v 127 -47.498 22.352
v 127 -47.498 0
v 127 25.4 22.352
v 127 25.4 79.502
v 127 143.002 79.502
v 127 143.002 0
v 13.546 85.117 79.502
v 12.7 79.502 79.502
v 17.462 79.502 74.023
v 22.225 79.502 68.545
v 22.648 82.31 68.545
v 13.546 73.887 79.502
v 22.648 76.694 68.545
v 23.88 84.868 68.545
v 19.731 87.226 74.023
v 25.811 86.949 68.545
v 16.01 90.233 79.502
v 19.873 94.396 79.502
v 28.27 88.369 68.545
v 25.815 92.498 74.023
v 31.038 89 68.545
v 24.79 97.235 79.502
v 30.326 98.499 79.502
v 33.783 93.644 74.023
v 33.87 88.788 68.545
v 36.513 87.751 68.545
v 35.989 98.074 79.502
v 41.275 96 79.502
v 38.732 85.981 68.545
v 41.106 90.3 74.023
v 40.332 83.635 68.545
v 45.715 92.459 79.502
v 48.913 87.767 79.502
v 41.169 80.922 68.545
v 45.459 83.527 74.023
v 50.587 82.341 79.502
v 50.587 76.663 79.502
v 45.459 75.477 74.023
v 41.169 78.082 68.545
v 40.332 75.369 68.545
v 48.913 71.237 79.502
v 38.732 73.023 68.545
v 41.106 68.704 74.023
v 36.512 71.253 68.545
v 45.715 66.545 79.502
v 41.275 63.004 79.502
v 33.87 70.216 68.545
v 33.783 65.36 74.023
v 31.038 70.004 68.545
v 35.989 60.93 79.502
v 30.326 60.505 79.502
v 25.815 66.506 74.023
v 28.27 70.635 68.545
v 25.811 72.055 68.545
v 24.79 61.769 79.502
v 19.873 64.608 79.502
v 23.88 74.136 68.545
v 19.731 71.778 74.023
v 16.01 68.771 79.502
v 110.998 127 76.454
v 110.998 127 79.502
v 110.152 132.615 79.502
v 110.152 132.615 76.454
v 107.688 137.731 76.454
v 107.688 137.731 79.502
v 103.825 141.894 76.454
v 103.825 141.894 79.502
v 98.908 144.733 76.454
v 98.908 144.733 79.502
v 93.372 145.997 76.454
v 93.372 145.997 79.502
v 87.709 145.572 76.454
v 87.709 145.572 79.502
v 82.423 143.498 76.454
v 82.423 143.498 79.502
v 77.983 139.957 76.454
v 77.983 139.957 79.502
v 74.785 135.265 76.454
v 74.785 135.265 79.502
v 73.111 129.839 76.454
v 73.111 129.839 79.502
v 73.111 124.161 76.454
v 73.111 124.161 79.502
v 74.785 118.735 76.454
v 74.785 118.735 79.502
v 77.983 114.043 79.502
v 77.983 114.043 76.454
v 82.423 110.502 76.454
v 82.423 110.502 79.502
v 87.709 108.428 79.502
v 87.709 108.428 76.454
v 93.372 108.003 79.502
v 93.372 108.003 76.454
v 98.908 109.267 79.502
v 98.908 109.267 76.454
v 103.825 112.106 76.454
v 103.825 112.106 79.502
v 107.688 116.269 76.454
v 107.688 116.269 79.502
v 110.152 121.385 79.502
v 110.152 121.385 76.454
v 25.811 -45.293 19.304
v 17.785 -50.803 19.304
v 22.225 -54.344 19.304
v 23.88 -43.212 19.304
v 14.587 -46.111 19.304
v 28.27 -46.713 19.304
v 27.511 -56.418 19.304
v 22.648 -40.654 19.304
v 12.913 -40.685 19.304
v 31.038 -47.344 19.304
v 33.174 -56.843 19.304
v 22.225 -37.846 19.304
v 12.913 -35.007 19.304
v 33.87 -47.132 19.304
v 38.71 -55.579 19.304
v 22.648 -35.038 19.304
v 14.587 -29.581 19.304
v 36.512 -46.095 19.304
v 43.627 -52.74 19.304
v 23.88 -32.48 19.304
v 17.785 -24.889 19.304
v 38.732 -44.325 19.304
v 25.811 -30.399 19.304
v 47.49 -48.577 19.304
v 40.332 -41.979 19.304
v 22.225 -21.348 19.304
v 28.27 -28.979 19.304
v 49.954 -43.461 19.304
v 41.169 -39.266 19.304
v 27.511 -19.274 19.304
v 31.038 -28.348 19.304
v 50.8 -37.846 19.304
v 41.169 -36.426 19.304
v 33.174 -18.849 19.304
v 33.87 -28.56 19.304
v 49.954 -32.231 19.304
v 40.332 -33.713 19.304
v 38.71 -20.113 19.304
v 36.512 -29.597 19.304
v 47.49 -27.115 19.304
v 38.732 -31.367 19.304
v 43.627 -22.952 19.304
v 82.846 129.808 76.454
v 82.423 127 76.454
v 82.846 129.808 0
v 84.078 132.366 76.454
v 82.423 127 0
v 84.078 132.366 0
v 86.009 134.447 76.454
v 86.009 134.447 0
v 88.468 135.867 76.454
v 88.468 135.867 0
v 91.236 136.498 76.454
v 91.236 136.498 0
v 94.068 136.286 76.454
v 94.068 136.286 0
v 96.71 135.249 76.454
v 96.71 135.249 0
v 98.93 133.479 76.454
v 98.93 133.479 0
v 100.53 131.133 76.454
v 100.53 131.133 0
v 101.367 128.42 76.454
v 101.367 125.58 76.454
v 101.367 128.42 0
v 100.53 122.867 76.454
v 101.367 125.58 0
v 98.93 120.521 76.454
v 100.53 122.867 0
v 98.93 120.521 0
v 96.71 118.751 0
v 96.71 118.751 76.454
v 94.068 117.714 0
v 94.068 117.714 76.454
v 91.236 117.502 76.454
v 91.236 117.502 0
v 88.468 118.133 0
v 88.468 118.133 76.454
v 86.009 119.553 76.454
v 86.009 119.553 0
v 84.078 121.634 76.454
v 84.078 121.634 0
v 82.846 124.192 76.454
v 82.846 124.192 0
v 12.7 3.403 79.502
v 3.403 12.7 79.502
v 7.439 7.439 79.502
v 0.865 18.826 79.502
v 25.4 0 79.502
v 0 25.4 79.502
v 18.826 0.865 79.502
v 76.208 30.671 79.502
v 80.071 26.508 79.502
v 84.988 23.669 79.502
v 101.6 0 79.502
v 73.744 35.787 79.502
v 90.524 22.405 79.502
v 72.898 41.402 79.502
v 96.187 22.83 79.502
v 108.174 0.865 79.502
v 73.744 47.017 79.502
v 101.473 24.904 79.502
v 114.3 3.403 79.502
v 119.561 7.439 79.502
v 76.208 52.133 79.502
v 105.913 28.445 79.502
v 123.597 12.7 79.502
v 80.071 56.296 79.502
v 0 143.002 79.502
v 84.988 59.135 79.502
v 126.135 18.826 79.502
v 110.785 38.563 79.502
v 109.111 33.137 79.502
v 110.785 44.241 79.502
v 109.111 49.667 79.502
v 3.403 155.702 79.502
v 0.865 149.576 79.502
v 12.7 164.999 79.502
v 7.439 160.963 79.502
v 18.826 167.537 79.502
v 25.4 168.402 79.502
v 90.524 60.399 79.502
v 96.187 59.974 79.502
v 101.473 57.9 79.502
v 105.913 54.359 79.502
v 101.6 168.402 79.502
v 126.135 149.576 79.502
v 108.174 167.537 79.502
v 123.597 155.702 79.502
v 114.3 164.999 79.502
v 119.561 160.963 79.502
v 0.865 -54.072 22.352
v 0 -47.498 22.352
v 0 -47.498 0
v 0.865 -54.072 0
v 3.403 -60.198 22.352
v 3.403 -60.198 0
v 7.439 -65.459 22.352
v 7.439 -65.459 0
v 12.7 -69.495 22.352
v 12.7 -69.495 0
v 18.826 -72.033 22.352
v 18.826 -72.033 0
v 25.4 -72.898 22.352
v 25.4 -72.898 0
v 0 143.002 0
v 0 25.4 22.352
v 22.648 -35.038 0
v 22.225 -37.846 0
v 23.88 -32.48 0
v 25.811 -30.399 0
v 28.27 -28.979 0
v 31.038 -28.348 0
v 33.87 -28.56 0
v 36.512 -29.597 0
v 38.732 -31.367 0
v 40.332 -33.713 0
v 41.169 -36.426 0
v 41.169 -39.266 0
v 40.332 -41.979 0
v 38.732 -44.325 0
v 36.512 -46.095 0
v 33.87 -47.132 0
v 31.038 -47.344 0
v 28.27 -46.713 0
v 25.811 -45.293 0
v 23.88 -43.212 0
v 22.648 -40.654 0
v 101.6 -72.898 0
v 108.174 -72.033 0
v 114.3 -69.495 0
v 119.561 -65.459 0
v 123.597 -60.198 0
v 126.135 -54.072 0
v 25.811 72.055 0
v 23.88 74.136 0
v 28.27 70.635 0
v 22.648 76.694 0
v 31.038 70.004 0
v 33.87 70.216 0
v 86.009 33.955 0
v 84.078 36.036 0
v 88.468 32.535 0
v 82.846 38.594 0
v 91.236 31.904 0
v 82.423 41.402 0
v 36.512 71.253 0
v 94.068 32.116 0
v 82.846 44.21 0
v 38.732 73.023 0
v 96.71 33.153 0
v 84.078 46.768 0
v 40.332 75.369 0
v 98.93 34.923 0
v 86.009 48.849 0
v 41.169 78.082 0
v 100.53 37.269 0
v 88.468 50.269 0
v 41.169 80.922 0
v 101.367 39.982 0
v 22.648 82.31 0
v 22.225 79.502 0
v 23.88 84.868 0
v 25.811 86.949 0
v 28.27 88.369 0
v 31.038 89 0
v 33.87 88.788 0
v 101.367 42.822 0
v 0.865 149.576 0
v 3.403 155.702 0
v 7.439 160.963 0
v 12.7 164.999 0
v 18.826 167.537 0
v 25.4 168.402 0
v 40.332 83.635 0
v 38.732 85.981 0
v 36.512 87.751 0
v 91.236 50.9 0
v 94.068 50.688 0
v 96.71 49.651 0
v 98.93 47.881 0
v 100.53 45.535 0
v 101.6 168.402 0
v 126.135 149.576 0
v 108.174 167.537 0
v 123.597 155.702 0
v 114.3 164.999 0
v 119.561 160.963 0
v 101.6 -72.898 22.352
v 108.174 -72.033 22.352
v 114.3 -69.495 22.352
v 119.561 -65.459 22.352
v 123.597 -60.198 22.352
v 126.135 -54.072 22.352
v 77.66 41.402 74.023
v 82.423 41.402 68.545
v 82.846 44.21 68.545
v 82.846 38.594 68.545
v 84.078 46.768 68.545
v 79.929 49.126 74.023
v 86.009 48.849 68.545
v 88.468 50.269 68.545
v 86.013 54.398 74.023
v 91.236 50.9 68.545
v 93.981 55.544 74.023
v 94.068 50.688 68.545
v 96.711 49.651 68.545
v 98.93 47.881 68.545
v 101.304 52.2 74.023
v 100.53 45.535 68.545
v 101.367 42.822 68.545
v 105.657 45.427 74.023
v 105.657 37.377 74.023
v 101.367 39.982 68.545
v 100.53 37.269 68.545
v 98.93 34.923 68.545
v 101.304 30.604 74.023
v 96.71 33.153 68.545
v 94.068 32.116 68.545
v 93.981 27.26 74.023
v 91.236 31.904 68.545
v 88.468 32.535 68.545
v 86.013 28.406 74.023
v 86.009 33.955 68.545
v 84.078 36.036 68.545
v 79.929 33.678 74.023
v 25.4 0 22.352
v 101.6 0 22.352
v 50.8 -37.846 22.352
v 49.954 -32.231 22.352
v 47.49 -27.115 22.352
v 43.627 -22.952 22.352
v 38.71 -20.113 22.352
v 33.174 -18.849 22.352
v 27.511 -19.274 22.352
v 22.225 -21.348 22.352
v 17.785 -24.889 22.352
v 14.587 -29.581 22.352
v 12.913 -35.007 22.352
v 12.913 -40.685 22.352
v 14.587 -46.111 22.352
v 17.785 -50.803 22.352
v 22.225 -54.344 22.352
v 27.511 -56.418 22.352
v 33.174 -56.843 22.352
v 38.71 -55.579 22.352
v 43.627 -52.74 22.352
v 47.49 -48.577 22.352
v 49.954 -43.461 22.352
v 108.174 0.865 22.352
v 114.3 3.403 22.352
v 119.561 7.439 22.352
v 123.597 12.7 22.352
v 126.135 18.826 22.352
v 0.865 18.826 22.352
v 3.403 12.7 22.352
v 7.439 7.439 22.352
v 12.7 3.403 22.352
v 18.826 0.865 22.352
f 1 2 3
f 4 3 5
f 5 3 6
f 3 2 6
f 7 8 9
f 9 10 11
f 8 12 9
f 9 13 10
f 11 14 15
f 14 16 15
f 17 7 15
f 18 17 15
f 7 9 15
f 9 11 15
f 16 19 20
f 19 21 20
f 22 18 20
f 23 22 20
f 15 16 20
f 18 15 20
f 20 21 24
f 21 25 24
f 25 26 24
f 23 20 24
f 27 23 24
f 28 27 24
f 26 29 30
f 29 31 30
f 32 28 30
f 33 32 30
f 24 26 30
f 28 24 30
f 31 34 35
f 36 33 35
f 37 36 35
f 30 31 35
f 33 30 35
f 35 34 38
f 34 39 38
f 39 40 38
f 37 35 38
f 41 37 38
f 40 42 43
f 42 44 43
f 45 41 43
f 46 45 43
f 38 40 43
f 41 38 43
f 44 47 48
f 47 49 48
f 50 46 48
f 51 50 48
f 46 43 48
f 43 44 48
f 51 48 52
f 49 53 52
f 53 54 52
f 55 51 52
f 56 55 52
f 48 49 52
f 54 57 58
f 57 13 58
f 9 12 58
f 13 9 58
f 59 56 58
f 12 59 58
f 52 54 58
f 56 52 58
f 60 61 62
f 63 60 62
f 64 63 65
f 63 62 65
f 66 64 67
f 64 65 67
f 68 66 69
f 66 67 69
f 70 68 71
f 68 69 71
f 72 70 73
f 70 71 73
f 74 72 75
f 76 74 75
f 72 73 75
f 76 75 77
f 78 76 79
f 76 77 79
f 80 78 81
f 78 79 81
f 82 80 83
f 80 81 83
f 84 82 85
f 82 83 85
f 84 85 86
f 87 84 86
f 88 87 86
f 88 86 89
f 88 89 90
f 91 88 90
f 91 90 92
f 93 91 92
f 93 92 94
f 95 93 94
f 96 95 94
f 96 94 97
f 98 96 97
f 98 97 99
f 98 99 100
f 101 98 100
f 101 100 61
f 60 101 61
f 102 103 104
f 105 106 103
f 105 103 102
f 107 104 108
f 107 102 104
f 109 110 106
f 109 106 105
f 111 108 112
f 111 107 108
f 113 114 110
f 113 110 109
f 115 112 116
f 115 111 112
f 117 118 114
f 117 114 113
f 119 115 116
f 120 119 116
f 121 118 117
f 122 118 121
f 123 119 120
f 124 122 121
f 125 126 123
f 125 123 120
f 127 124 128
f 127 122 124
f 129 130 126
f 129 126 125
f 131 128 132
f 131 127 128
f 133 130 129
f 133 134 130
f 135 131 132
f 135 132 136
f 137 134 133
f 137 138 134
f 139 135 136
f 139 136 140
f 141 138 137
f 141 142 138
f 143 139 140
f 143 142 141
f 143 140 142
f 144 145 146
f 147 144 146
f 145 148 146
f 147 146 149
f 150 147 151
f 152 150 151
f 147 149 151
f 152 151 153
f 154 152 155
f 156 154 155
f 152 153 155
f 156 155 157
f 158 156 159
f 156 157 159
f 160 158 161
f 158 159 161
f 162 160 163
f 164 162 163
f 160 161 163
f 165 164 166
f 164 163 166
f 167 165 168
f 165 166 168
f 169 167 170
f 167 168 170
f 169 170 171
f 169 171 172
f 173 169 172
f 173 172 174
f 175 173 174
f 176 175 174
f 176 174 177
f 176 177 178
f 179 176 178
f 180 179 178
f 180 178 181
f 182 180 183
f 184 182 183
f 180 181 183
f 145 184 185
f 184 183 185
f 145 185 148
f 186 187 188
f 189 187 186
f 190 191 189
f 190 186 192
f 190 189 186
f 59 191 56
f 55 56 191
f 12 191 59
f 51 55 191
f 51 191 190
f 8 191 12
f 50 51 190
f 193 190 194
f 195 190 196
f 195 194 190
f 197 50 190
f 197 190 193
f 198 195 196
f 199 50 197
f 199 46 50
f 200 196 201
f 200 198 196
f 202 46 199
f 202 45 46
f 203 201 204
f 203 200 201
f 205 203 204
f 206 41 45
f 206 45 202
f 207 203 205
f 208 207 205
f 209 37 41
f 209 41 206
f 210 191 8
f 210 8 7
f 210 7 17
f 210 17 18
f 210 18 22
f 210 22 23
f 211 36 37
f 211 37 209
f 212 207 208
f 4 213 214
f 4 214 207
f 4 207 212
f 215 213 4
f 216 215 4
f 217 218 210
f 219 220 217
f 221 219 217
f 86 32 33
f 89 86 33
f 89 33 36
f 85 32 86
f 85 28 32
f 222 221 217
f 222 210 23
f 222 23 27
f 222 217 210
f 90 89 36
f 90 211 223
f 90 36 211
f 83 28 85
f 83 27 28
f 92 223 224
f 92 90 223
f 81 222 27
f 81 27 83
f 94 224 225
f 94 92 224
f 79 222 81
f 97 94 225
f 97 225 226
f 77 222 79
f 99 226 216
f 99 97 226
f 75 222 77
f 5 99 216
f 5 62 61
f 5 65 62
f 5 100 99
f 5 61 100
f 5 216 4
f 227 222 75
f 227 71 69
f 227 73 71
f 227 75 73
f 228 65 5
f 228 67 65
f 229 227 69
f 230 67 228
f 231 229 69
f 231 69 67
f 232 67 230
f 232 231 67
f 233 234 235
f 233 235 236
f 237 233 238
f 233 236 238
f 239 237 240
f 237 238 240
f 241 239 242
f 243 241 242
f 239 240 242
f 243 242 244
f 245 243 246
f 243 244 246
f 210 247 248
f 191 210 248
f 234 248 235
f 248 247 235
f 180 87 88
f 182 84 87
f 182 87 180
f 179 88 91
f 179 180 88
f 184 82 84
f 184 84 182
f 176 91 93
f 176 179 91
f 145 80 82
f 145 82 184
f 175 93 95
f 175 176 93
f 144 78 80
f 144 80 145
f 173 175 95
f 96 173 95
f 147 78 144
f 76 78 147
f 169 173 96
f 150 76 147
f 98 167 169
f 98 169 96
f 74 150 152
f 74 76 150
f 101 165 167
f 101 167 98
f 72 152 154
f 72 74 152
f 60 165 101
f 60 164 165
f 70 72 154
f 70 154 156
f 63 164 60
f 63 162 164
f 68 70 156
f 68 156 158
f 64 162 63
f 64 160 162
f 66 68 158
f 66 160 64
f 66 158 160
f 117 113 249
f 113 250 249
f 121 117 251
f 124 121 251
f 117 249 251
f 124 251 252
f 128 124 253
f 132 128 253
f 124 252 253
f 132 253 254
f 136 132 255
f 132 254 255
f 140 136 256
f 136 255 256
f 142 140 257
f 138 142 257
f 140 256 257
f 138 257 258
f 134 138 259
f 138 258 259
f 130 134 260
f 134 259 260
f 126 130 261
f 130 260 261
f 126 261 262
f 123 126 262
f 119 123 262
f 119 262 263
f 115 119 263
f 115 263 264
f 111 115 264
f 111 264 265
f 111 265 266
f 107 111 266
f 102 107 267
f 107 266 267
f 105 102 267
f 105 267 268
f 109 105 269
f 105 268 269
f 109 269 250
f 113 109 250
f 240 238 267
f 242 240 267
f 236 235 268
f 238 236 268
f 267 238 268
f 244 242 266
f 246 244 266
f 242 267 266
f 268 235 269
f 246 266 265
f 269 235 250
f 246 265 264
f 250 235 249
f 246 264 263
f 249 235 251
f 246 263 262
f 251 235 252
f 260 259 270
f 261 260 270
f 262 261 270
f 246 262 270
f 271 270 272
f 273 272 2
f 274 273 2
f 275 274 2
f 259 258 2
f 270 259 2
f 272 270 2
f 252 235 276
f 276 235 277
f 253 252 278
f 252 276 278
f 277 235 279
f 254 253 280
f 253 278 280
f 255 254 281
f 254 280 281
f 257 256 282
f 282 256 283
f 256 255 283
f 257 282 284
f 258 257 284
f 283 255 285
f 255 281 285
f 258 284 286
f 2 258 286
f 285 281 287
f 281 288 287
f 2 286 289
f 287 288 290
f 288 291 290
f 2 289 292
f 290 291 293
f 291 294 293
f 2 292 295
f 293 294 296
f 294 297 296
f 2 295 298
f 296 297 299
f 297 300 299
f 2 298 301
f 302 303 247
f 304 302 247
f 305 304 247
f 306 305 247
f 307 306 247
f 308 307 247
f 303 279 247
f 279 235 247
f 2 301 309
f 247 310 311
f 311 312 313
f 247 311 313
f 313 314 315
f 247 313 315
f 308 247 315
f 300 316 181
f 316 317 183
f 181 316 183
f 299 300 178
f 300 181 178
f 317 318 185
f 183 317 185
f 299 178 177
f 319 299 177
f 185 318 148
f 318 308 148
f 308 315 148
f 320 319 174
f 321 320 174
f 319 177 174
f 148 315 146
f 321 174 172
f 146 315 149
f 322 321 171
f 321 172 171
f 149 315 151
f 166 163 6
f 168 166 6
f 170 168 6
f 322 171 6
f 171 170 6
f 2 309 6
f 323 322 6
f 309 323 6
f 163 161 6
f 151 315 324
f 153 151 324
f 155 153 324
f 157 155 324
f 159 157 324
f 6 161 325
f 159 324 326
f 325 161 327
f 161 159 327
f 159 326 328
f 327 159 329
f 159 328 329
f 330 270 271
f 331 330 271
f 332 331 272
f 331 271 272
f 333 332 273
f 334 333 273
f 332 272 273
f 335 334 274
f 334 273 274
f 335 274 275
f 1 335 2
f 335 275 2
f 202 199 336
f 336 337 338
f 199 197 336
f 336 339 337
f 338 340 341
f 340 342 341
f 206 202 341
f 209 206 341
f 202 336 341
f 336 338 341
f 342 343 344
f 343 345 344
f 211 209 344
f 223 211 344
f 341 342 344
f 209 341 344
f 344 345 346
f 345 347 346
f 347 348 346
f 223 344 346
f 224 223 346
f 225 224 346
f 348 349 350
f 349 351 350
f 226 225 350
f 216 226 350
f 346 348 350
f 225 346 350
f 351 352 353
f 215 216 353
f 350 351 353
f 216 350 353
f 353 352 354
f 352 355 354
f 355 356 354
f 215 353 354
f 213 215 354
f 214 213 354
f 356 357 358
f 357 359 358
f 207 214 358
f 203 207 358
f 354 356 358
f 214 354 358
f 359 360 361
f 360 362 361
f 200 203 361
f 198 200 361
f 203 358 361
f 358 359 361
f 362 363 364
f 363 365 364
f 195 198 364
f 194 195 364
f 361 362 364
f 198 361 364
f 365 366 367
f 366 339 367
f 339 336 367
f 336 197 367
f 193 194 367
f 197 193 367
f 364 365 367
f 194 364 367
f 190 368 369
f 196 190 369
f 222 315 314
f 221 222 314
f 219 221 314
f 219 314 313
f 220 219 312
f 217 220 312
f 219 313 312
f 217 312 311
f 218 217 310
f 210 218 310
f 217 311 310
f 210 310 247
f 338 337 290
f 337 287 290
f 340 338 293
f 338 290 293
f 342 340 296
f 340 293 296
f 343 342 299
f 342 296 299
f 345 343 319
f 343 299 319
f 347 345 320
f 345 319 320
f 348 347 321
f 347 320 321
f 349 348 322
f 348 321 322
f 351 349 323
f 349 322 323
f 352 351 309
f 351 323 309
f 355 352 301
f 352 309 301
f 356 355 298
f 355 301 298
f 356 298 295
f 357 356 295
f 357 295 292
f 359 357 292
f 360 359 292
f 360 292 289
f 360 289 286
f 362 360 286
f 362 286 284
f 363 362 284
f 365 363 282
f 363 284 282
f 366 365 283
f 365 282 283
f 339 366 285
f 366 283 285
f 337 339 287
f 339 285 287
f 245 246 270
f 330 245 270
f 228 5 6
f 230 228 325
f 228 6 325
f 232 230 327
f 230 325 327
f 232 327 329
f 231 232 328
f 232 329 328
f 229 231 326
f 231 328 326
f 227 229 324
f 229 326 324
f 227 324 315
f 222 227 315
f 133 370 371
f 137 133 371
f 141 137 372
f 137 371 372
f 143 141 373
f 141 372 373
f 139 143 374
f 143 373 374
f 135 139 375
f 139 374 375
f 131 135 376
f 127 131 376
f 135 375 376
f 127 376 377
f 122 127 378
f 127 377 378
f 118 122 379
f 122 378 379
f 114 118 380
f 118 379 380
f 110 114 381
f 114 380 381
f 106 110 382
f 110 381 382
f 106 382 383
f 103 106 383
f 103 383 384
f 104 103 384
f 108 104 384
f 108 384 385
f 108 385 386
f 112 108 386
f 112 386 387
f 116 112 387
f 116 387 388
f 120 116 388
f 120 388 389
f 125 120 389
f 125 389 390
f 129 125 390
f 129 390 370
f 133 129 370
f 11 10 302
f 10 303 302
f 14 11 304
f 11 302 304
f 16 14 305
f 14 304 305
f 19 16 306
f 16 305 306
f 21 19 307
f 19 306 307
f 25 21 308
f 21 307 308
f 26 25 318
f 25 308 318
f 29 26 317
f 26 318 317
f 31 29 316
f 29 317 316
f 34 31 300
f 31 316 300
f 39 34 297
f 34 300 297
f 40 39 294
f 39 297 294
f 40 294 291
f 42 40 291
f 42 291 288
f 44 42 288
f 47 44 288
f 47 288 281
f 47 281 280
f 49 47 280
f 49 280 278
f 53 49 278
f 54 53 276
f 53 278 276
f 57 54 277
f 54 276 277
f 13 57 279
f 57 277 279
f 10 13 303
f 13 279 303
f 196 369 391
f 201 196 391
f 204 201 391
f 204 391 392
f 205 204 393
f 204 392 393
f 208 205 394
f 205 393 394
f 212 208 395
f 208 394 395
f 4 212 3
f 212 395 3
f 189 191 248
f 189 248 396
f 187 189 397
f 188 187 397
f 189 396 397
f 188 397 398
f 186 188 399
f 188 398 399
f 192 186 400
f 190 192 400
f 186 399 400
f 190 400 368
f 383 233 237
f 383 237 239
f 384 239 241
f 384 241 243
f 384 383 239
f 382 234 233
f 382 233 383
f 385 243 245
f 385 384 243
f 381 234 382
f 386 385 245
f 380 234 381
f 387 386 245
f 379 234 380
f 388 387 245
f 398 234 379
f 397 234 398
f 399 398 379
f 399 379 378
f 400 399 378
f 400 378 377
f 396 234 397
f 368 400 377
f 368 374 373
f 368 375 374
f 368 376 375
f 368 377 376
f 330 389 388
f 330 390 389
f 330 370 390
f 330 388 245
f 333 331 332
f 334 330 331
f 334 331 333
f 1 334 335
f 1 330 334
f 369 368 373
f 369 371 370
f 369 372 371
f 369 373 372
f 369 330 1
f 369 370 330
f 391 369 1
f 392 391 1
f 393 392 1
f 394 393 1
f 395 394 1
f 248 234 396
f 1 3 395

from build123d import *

# Parameters (mm, degrees)
F1_DEPTH             = 22.352
F2_DEPTH             = 79.502
F5_D                 = 19.05
F5_CBORE_D           = 38.1
F5_CBORE_DEPTH       = 3.048
F5_ON_F4_D           = 19.05
F5_ON_F4_CBORE_D     = 38.1
F5_ON_F4_CBORE_DEPTH = 3.048
F6_D                 = 19.05
F6_CSINK_D           = 38.1
F6_CSINK_ANGLE       = 82


with BuildPart() as f1:
    # F0 (on Top) → F1 (new body)
    with BuildSketch(Plane.XY):
        with BuildLine():
            ThreePointArc((25.4, 0), (7.4394877579, 7.4394877579), (0, 25.4))
            Line((0, 25.4), (0, -47.498))
            ThreePointArc((0, -47.498), (7.4394877579, -65.4585122421), (25.4, -72.898))
            Line((25.4, -72.898), (101.6, -72.898))
            ThreePointArc((101.6, -72.898), (119.5605122421, -65.4585122421), (127, -47.498))
            Line((127, -47.498), (127, 25.4))
            ThreePointArc((127, 25.4), (119.5605122421, 7.4394877579), (101.6, 0))
            Line((101.6, 0), (25.4, 0))
        make_face()
    extrude(amount=F1_DEPTH)

    # F0 (on Top) → F2 (join)
    with BuildSketch(Plane.XY):
        with BuildLine():
            Line((0, 143.002), (0, 25.4))
            ThreePointArc((0, 25.4), (7.4394877579, 7.4394877579), (25.4, 0))
            Line((25.4, 0), (101.6, 0))
            ThreePointArc((101.6, 0), (119.5605122421, 7.4394877579), (127, 25.4))
            Line((127, 25.4), (127, 143.002))
            ThreePointArc((127, 143.002), (119.5605122421, 160.9625122421), (101.6, 168.402))
            Line((101.6, 168.402), (25.4, 168.402))
            ThreePointArc((25.4, 168.402), (7.4394877579, 160.9625122421), (0, 143.002))
        make_face()
    extrude(amount=F2_DEPTH)

    # F5 (through all)
    with Locations(Plane.XY.offset(79.502)):
        with Locations((91.948, 127)):
            CounterBoreHole(F5_D / 2, F5_CBORE_D / 2, F5_CBORE_DEPTH)

    # F5 on F4 (through all)
    with Locations(Plane.XY.offset(22.352)):
        with Locations((31.75, -37.846)):
            CounterBoreHole(F5_ON_F4_D / 2, F5_ON_F4_CBORE_D / 2, F5_ON_F4_CBORE_DEPTH)

    # F6 (through all)
    with Locations(Plane.XY.offset(79.502)):
        with Locations((31.75, 79.502), (91.948, 41.402)):
            CounterSinkHole(F6_D / 2, F6_CSINK_D / 2, counter_sink_angle=F6_CSINK_ANGLE)


solid = f1.part
